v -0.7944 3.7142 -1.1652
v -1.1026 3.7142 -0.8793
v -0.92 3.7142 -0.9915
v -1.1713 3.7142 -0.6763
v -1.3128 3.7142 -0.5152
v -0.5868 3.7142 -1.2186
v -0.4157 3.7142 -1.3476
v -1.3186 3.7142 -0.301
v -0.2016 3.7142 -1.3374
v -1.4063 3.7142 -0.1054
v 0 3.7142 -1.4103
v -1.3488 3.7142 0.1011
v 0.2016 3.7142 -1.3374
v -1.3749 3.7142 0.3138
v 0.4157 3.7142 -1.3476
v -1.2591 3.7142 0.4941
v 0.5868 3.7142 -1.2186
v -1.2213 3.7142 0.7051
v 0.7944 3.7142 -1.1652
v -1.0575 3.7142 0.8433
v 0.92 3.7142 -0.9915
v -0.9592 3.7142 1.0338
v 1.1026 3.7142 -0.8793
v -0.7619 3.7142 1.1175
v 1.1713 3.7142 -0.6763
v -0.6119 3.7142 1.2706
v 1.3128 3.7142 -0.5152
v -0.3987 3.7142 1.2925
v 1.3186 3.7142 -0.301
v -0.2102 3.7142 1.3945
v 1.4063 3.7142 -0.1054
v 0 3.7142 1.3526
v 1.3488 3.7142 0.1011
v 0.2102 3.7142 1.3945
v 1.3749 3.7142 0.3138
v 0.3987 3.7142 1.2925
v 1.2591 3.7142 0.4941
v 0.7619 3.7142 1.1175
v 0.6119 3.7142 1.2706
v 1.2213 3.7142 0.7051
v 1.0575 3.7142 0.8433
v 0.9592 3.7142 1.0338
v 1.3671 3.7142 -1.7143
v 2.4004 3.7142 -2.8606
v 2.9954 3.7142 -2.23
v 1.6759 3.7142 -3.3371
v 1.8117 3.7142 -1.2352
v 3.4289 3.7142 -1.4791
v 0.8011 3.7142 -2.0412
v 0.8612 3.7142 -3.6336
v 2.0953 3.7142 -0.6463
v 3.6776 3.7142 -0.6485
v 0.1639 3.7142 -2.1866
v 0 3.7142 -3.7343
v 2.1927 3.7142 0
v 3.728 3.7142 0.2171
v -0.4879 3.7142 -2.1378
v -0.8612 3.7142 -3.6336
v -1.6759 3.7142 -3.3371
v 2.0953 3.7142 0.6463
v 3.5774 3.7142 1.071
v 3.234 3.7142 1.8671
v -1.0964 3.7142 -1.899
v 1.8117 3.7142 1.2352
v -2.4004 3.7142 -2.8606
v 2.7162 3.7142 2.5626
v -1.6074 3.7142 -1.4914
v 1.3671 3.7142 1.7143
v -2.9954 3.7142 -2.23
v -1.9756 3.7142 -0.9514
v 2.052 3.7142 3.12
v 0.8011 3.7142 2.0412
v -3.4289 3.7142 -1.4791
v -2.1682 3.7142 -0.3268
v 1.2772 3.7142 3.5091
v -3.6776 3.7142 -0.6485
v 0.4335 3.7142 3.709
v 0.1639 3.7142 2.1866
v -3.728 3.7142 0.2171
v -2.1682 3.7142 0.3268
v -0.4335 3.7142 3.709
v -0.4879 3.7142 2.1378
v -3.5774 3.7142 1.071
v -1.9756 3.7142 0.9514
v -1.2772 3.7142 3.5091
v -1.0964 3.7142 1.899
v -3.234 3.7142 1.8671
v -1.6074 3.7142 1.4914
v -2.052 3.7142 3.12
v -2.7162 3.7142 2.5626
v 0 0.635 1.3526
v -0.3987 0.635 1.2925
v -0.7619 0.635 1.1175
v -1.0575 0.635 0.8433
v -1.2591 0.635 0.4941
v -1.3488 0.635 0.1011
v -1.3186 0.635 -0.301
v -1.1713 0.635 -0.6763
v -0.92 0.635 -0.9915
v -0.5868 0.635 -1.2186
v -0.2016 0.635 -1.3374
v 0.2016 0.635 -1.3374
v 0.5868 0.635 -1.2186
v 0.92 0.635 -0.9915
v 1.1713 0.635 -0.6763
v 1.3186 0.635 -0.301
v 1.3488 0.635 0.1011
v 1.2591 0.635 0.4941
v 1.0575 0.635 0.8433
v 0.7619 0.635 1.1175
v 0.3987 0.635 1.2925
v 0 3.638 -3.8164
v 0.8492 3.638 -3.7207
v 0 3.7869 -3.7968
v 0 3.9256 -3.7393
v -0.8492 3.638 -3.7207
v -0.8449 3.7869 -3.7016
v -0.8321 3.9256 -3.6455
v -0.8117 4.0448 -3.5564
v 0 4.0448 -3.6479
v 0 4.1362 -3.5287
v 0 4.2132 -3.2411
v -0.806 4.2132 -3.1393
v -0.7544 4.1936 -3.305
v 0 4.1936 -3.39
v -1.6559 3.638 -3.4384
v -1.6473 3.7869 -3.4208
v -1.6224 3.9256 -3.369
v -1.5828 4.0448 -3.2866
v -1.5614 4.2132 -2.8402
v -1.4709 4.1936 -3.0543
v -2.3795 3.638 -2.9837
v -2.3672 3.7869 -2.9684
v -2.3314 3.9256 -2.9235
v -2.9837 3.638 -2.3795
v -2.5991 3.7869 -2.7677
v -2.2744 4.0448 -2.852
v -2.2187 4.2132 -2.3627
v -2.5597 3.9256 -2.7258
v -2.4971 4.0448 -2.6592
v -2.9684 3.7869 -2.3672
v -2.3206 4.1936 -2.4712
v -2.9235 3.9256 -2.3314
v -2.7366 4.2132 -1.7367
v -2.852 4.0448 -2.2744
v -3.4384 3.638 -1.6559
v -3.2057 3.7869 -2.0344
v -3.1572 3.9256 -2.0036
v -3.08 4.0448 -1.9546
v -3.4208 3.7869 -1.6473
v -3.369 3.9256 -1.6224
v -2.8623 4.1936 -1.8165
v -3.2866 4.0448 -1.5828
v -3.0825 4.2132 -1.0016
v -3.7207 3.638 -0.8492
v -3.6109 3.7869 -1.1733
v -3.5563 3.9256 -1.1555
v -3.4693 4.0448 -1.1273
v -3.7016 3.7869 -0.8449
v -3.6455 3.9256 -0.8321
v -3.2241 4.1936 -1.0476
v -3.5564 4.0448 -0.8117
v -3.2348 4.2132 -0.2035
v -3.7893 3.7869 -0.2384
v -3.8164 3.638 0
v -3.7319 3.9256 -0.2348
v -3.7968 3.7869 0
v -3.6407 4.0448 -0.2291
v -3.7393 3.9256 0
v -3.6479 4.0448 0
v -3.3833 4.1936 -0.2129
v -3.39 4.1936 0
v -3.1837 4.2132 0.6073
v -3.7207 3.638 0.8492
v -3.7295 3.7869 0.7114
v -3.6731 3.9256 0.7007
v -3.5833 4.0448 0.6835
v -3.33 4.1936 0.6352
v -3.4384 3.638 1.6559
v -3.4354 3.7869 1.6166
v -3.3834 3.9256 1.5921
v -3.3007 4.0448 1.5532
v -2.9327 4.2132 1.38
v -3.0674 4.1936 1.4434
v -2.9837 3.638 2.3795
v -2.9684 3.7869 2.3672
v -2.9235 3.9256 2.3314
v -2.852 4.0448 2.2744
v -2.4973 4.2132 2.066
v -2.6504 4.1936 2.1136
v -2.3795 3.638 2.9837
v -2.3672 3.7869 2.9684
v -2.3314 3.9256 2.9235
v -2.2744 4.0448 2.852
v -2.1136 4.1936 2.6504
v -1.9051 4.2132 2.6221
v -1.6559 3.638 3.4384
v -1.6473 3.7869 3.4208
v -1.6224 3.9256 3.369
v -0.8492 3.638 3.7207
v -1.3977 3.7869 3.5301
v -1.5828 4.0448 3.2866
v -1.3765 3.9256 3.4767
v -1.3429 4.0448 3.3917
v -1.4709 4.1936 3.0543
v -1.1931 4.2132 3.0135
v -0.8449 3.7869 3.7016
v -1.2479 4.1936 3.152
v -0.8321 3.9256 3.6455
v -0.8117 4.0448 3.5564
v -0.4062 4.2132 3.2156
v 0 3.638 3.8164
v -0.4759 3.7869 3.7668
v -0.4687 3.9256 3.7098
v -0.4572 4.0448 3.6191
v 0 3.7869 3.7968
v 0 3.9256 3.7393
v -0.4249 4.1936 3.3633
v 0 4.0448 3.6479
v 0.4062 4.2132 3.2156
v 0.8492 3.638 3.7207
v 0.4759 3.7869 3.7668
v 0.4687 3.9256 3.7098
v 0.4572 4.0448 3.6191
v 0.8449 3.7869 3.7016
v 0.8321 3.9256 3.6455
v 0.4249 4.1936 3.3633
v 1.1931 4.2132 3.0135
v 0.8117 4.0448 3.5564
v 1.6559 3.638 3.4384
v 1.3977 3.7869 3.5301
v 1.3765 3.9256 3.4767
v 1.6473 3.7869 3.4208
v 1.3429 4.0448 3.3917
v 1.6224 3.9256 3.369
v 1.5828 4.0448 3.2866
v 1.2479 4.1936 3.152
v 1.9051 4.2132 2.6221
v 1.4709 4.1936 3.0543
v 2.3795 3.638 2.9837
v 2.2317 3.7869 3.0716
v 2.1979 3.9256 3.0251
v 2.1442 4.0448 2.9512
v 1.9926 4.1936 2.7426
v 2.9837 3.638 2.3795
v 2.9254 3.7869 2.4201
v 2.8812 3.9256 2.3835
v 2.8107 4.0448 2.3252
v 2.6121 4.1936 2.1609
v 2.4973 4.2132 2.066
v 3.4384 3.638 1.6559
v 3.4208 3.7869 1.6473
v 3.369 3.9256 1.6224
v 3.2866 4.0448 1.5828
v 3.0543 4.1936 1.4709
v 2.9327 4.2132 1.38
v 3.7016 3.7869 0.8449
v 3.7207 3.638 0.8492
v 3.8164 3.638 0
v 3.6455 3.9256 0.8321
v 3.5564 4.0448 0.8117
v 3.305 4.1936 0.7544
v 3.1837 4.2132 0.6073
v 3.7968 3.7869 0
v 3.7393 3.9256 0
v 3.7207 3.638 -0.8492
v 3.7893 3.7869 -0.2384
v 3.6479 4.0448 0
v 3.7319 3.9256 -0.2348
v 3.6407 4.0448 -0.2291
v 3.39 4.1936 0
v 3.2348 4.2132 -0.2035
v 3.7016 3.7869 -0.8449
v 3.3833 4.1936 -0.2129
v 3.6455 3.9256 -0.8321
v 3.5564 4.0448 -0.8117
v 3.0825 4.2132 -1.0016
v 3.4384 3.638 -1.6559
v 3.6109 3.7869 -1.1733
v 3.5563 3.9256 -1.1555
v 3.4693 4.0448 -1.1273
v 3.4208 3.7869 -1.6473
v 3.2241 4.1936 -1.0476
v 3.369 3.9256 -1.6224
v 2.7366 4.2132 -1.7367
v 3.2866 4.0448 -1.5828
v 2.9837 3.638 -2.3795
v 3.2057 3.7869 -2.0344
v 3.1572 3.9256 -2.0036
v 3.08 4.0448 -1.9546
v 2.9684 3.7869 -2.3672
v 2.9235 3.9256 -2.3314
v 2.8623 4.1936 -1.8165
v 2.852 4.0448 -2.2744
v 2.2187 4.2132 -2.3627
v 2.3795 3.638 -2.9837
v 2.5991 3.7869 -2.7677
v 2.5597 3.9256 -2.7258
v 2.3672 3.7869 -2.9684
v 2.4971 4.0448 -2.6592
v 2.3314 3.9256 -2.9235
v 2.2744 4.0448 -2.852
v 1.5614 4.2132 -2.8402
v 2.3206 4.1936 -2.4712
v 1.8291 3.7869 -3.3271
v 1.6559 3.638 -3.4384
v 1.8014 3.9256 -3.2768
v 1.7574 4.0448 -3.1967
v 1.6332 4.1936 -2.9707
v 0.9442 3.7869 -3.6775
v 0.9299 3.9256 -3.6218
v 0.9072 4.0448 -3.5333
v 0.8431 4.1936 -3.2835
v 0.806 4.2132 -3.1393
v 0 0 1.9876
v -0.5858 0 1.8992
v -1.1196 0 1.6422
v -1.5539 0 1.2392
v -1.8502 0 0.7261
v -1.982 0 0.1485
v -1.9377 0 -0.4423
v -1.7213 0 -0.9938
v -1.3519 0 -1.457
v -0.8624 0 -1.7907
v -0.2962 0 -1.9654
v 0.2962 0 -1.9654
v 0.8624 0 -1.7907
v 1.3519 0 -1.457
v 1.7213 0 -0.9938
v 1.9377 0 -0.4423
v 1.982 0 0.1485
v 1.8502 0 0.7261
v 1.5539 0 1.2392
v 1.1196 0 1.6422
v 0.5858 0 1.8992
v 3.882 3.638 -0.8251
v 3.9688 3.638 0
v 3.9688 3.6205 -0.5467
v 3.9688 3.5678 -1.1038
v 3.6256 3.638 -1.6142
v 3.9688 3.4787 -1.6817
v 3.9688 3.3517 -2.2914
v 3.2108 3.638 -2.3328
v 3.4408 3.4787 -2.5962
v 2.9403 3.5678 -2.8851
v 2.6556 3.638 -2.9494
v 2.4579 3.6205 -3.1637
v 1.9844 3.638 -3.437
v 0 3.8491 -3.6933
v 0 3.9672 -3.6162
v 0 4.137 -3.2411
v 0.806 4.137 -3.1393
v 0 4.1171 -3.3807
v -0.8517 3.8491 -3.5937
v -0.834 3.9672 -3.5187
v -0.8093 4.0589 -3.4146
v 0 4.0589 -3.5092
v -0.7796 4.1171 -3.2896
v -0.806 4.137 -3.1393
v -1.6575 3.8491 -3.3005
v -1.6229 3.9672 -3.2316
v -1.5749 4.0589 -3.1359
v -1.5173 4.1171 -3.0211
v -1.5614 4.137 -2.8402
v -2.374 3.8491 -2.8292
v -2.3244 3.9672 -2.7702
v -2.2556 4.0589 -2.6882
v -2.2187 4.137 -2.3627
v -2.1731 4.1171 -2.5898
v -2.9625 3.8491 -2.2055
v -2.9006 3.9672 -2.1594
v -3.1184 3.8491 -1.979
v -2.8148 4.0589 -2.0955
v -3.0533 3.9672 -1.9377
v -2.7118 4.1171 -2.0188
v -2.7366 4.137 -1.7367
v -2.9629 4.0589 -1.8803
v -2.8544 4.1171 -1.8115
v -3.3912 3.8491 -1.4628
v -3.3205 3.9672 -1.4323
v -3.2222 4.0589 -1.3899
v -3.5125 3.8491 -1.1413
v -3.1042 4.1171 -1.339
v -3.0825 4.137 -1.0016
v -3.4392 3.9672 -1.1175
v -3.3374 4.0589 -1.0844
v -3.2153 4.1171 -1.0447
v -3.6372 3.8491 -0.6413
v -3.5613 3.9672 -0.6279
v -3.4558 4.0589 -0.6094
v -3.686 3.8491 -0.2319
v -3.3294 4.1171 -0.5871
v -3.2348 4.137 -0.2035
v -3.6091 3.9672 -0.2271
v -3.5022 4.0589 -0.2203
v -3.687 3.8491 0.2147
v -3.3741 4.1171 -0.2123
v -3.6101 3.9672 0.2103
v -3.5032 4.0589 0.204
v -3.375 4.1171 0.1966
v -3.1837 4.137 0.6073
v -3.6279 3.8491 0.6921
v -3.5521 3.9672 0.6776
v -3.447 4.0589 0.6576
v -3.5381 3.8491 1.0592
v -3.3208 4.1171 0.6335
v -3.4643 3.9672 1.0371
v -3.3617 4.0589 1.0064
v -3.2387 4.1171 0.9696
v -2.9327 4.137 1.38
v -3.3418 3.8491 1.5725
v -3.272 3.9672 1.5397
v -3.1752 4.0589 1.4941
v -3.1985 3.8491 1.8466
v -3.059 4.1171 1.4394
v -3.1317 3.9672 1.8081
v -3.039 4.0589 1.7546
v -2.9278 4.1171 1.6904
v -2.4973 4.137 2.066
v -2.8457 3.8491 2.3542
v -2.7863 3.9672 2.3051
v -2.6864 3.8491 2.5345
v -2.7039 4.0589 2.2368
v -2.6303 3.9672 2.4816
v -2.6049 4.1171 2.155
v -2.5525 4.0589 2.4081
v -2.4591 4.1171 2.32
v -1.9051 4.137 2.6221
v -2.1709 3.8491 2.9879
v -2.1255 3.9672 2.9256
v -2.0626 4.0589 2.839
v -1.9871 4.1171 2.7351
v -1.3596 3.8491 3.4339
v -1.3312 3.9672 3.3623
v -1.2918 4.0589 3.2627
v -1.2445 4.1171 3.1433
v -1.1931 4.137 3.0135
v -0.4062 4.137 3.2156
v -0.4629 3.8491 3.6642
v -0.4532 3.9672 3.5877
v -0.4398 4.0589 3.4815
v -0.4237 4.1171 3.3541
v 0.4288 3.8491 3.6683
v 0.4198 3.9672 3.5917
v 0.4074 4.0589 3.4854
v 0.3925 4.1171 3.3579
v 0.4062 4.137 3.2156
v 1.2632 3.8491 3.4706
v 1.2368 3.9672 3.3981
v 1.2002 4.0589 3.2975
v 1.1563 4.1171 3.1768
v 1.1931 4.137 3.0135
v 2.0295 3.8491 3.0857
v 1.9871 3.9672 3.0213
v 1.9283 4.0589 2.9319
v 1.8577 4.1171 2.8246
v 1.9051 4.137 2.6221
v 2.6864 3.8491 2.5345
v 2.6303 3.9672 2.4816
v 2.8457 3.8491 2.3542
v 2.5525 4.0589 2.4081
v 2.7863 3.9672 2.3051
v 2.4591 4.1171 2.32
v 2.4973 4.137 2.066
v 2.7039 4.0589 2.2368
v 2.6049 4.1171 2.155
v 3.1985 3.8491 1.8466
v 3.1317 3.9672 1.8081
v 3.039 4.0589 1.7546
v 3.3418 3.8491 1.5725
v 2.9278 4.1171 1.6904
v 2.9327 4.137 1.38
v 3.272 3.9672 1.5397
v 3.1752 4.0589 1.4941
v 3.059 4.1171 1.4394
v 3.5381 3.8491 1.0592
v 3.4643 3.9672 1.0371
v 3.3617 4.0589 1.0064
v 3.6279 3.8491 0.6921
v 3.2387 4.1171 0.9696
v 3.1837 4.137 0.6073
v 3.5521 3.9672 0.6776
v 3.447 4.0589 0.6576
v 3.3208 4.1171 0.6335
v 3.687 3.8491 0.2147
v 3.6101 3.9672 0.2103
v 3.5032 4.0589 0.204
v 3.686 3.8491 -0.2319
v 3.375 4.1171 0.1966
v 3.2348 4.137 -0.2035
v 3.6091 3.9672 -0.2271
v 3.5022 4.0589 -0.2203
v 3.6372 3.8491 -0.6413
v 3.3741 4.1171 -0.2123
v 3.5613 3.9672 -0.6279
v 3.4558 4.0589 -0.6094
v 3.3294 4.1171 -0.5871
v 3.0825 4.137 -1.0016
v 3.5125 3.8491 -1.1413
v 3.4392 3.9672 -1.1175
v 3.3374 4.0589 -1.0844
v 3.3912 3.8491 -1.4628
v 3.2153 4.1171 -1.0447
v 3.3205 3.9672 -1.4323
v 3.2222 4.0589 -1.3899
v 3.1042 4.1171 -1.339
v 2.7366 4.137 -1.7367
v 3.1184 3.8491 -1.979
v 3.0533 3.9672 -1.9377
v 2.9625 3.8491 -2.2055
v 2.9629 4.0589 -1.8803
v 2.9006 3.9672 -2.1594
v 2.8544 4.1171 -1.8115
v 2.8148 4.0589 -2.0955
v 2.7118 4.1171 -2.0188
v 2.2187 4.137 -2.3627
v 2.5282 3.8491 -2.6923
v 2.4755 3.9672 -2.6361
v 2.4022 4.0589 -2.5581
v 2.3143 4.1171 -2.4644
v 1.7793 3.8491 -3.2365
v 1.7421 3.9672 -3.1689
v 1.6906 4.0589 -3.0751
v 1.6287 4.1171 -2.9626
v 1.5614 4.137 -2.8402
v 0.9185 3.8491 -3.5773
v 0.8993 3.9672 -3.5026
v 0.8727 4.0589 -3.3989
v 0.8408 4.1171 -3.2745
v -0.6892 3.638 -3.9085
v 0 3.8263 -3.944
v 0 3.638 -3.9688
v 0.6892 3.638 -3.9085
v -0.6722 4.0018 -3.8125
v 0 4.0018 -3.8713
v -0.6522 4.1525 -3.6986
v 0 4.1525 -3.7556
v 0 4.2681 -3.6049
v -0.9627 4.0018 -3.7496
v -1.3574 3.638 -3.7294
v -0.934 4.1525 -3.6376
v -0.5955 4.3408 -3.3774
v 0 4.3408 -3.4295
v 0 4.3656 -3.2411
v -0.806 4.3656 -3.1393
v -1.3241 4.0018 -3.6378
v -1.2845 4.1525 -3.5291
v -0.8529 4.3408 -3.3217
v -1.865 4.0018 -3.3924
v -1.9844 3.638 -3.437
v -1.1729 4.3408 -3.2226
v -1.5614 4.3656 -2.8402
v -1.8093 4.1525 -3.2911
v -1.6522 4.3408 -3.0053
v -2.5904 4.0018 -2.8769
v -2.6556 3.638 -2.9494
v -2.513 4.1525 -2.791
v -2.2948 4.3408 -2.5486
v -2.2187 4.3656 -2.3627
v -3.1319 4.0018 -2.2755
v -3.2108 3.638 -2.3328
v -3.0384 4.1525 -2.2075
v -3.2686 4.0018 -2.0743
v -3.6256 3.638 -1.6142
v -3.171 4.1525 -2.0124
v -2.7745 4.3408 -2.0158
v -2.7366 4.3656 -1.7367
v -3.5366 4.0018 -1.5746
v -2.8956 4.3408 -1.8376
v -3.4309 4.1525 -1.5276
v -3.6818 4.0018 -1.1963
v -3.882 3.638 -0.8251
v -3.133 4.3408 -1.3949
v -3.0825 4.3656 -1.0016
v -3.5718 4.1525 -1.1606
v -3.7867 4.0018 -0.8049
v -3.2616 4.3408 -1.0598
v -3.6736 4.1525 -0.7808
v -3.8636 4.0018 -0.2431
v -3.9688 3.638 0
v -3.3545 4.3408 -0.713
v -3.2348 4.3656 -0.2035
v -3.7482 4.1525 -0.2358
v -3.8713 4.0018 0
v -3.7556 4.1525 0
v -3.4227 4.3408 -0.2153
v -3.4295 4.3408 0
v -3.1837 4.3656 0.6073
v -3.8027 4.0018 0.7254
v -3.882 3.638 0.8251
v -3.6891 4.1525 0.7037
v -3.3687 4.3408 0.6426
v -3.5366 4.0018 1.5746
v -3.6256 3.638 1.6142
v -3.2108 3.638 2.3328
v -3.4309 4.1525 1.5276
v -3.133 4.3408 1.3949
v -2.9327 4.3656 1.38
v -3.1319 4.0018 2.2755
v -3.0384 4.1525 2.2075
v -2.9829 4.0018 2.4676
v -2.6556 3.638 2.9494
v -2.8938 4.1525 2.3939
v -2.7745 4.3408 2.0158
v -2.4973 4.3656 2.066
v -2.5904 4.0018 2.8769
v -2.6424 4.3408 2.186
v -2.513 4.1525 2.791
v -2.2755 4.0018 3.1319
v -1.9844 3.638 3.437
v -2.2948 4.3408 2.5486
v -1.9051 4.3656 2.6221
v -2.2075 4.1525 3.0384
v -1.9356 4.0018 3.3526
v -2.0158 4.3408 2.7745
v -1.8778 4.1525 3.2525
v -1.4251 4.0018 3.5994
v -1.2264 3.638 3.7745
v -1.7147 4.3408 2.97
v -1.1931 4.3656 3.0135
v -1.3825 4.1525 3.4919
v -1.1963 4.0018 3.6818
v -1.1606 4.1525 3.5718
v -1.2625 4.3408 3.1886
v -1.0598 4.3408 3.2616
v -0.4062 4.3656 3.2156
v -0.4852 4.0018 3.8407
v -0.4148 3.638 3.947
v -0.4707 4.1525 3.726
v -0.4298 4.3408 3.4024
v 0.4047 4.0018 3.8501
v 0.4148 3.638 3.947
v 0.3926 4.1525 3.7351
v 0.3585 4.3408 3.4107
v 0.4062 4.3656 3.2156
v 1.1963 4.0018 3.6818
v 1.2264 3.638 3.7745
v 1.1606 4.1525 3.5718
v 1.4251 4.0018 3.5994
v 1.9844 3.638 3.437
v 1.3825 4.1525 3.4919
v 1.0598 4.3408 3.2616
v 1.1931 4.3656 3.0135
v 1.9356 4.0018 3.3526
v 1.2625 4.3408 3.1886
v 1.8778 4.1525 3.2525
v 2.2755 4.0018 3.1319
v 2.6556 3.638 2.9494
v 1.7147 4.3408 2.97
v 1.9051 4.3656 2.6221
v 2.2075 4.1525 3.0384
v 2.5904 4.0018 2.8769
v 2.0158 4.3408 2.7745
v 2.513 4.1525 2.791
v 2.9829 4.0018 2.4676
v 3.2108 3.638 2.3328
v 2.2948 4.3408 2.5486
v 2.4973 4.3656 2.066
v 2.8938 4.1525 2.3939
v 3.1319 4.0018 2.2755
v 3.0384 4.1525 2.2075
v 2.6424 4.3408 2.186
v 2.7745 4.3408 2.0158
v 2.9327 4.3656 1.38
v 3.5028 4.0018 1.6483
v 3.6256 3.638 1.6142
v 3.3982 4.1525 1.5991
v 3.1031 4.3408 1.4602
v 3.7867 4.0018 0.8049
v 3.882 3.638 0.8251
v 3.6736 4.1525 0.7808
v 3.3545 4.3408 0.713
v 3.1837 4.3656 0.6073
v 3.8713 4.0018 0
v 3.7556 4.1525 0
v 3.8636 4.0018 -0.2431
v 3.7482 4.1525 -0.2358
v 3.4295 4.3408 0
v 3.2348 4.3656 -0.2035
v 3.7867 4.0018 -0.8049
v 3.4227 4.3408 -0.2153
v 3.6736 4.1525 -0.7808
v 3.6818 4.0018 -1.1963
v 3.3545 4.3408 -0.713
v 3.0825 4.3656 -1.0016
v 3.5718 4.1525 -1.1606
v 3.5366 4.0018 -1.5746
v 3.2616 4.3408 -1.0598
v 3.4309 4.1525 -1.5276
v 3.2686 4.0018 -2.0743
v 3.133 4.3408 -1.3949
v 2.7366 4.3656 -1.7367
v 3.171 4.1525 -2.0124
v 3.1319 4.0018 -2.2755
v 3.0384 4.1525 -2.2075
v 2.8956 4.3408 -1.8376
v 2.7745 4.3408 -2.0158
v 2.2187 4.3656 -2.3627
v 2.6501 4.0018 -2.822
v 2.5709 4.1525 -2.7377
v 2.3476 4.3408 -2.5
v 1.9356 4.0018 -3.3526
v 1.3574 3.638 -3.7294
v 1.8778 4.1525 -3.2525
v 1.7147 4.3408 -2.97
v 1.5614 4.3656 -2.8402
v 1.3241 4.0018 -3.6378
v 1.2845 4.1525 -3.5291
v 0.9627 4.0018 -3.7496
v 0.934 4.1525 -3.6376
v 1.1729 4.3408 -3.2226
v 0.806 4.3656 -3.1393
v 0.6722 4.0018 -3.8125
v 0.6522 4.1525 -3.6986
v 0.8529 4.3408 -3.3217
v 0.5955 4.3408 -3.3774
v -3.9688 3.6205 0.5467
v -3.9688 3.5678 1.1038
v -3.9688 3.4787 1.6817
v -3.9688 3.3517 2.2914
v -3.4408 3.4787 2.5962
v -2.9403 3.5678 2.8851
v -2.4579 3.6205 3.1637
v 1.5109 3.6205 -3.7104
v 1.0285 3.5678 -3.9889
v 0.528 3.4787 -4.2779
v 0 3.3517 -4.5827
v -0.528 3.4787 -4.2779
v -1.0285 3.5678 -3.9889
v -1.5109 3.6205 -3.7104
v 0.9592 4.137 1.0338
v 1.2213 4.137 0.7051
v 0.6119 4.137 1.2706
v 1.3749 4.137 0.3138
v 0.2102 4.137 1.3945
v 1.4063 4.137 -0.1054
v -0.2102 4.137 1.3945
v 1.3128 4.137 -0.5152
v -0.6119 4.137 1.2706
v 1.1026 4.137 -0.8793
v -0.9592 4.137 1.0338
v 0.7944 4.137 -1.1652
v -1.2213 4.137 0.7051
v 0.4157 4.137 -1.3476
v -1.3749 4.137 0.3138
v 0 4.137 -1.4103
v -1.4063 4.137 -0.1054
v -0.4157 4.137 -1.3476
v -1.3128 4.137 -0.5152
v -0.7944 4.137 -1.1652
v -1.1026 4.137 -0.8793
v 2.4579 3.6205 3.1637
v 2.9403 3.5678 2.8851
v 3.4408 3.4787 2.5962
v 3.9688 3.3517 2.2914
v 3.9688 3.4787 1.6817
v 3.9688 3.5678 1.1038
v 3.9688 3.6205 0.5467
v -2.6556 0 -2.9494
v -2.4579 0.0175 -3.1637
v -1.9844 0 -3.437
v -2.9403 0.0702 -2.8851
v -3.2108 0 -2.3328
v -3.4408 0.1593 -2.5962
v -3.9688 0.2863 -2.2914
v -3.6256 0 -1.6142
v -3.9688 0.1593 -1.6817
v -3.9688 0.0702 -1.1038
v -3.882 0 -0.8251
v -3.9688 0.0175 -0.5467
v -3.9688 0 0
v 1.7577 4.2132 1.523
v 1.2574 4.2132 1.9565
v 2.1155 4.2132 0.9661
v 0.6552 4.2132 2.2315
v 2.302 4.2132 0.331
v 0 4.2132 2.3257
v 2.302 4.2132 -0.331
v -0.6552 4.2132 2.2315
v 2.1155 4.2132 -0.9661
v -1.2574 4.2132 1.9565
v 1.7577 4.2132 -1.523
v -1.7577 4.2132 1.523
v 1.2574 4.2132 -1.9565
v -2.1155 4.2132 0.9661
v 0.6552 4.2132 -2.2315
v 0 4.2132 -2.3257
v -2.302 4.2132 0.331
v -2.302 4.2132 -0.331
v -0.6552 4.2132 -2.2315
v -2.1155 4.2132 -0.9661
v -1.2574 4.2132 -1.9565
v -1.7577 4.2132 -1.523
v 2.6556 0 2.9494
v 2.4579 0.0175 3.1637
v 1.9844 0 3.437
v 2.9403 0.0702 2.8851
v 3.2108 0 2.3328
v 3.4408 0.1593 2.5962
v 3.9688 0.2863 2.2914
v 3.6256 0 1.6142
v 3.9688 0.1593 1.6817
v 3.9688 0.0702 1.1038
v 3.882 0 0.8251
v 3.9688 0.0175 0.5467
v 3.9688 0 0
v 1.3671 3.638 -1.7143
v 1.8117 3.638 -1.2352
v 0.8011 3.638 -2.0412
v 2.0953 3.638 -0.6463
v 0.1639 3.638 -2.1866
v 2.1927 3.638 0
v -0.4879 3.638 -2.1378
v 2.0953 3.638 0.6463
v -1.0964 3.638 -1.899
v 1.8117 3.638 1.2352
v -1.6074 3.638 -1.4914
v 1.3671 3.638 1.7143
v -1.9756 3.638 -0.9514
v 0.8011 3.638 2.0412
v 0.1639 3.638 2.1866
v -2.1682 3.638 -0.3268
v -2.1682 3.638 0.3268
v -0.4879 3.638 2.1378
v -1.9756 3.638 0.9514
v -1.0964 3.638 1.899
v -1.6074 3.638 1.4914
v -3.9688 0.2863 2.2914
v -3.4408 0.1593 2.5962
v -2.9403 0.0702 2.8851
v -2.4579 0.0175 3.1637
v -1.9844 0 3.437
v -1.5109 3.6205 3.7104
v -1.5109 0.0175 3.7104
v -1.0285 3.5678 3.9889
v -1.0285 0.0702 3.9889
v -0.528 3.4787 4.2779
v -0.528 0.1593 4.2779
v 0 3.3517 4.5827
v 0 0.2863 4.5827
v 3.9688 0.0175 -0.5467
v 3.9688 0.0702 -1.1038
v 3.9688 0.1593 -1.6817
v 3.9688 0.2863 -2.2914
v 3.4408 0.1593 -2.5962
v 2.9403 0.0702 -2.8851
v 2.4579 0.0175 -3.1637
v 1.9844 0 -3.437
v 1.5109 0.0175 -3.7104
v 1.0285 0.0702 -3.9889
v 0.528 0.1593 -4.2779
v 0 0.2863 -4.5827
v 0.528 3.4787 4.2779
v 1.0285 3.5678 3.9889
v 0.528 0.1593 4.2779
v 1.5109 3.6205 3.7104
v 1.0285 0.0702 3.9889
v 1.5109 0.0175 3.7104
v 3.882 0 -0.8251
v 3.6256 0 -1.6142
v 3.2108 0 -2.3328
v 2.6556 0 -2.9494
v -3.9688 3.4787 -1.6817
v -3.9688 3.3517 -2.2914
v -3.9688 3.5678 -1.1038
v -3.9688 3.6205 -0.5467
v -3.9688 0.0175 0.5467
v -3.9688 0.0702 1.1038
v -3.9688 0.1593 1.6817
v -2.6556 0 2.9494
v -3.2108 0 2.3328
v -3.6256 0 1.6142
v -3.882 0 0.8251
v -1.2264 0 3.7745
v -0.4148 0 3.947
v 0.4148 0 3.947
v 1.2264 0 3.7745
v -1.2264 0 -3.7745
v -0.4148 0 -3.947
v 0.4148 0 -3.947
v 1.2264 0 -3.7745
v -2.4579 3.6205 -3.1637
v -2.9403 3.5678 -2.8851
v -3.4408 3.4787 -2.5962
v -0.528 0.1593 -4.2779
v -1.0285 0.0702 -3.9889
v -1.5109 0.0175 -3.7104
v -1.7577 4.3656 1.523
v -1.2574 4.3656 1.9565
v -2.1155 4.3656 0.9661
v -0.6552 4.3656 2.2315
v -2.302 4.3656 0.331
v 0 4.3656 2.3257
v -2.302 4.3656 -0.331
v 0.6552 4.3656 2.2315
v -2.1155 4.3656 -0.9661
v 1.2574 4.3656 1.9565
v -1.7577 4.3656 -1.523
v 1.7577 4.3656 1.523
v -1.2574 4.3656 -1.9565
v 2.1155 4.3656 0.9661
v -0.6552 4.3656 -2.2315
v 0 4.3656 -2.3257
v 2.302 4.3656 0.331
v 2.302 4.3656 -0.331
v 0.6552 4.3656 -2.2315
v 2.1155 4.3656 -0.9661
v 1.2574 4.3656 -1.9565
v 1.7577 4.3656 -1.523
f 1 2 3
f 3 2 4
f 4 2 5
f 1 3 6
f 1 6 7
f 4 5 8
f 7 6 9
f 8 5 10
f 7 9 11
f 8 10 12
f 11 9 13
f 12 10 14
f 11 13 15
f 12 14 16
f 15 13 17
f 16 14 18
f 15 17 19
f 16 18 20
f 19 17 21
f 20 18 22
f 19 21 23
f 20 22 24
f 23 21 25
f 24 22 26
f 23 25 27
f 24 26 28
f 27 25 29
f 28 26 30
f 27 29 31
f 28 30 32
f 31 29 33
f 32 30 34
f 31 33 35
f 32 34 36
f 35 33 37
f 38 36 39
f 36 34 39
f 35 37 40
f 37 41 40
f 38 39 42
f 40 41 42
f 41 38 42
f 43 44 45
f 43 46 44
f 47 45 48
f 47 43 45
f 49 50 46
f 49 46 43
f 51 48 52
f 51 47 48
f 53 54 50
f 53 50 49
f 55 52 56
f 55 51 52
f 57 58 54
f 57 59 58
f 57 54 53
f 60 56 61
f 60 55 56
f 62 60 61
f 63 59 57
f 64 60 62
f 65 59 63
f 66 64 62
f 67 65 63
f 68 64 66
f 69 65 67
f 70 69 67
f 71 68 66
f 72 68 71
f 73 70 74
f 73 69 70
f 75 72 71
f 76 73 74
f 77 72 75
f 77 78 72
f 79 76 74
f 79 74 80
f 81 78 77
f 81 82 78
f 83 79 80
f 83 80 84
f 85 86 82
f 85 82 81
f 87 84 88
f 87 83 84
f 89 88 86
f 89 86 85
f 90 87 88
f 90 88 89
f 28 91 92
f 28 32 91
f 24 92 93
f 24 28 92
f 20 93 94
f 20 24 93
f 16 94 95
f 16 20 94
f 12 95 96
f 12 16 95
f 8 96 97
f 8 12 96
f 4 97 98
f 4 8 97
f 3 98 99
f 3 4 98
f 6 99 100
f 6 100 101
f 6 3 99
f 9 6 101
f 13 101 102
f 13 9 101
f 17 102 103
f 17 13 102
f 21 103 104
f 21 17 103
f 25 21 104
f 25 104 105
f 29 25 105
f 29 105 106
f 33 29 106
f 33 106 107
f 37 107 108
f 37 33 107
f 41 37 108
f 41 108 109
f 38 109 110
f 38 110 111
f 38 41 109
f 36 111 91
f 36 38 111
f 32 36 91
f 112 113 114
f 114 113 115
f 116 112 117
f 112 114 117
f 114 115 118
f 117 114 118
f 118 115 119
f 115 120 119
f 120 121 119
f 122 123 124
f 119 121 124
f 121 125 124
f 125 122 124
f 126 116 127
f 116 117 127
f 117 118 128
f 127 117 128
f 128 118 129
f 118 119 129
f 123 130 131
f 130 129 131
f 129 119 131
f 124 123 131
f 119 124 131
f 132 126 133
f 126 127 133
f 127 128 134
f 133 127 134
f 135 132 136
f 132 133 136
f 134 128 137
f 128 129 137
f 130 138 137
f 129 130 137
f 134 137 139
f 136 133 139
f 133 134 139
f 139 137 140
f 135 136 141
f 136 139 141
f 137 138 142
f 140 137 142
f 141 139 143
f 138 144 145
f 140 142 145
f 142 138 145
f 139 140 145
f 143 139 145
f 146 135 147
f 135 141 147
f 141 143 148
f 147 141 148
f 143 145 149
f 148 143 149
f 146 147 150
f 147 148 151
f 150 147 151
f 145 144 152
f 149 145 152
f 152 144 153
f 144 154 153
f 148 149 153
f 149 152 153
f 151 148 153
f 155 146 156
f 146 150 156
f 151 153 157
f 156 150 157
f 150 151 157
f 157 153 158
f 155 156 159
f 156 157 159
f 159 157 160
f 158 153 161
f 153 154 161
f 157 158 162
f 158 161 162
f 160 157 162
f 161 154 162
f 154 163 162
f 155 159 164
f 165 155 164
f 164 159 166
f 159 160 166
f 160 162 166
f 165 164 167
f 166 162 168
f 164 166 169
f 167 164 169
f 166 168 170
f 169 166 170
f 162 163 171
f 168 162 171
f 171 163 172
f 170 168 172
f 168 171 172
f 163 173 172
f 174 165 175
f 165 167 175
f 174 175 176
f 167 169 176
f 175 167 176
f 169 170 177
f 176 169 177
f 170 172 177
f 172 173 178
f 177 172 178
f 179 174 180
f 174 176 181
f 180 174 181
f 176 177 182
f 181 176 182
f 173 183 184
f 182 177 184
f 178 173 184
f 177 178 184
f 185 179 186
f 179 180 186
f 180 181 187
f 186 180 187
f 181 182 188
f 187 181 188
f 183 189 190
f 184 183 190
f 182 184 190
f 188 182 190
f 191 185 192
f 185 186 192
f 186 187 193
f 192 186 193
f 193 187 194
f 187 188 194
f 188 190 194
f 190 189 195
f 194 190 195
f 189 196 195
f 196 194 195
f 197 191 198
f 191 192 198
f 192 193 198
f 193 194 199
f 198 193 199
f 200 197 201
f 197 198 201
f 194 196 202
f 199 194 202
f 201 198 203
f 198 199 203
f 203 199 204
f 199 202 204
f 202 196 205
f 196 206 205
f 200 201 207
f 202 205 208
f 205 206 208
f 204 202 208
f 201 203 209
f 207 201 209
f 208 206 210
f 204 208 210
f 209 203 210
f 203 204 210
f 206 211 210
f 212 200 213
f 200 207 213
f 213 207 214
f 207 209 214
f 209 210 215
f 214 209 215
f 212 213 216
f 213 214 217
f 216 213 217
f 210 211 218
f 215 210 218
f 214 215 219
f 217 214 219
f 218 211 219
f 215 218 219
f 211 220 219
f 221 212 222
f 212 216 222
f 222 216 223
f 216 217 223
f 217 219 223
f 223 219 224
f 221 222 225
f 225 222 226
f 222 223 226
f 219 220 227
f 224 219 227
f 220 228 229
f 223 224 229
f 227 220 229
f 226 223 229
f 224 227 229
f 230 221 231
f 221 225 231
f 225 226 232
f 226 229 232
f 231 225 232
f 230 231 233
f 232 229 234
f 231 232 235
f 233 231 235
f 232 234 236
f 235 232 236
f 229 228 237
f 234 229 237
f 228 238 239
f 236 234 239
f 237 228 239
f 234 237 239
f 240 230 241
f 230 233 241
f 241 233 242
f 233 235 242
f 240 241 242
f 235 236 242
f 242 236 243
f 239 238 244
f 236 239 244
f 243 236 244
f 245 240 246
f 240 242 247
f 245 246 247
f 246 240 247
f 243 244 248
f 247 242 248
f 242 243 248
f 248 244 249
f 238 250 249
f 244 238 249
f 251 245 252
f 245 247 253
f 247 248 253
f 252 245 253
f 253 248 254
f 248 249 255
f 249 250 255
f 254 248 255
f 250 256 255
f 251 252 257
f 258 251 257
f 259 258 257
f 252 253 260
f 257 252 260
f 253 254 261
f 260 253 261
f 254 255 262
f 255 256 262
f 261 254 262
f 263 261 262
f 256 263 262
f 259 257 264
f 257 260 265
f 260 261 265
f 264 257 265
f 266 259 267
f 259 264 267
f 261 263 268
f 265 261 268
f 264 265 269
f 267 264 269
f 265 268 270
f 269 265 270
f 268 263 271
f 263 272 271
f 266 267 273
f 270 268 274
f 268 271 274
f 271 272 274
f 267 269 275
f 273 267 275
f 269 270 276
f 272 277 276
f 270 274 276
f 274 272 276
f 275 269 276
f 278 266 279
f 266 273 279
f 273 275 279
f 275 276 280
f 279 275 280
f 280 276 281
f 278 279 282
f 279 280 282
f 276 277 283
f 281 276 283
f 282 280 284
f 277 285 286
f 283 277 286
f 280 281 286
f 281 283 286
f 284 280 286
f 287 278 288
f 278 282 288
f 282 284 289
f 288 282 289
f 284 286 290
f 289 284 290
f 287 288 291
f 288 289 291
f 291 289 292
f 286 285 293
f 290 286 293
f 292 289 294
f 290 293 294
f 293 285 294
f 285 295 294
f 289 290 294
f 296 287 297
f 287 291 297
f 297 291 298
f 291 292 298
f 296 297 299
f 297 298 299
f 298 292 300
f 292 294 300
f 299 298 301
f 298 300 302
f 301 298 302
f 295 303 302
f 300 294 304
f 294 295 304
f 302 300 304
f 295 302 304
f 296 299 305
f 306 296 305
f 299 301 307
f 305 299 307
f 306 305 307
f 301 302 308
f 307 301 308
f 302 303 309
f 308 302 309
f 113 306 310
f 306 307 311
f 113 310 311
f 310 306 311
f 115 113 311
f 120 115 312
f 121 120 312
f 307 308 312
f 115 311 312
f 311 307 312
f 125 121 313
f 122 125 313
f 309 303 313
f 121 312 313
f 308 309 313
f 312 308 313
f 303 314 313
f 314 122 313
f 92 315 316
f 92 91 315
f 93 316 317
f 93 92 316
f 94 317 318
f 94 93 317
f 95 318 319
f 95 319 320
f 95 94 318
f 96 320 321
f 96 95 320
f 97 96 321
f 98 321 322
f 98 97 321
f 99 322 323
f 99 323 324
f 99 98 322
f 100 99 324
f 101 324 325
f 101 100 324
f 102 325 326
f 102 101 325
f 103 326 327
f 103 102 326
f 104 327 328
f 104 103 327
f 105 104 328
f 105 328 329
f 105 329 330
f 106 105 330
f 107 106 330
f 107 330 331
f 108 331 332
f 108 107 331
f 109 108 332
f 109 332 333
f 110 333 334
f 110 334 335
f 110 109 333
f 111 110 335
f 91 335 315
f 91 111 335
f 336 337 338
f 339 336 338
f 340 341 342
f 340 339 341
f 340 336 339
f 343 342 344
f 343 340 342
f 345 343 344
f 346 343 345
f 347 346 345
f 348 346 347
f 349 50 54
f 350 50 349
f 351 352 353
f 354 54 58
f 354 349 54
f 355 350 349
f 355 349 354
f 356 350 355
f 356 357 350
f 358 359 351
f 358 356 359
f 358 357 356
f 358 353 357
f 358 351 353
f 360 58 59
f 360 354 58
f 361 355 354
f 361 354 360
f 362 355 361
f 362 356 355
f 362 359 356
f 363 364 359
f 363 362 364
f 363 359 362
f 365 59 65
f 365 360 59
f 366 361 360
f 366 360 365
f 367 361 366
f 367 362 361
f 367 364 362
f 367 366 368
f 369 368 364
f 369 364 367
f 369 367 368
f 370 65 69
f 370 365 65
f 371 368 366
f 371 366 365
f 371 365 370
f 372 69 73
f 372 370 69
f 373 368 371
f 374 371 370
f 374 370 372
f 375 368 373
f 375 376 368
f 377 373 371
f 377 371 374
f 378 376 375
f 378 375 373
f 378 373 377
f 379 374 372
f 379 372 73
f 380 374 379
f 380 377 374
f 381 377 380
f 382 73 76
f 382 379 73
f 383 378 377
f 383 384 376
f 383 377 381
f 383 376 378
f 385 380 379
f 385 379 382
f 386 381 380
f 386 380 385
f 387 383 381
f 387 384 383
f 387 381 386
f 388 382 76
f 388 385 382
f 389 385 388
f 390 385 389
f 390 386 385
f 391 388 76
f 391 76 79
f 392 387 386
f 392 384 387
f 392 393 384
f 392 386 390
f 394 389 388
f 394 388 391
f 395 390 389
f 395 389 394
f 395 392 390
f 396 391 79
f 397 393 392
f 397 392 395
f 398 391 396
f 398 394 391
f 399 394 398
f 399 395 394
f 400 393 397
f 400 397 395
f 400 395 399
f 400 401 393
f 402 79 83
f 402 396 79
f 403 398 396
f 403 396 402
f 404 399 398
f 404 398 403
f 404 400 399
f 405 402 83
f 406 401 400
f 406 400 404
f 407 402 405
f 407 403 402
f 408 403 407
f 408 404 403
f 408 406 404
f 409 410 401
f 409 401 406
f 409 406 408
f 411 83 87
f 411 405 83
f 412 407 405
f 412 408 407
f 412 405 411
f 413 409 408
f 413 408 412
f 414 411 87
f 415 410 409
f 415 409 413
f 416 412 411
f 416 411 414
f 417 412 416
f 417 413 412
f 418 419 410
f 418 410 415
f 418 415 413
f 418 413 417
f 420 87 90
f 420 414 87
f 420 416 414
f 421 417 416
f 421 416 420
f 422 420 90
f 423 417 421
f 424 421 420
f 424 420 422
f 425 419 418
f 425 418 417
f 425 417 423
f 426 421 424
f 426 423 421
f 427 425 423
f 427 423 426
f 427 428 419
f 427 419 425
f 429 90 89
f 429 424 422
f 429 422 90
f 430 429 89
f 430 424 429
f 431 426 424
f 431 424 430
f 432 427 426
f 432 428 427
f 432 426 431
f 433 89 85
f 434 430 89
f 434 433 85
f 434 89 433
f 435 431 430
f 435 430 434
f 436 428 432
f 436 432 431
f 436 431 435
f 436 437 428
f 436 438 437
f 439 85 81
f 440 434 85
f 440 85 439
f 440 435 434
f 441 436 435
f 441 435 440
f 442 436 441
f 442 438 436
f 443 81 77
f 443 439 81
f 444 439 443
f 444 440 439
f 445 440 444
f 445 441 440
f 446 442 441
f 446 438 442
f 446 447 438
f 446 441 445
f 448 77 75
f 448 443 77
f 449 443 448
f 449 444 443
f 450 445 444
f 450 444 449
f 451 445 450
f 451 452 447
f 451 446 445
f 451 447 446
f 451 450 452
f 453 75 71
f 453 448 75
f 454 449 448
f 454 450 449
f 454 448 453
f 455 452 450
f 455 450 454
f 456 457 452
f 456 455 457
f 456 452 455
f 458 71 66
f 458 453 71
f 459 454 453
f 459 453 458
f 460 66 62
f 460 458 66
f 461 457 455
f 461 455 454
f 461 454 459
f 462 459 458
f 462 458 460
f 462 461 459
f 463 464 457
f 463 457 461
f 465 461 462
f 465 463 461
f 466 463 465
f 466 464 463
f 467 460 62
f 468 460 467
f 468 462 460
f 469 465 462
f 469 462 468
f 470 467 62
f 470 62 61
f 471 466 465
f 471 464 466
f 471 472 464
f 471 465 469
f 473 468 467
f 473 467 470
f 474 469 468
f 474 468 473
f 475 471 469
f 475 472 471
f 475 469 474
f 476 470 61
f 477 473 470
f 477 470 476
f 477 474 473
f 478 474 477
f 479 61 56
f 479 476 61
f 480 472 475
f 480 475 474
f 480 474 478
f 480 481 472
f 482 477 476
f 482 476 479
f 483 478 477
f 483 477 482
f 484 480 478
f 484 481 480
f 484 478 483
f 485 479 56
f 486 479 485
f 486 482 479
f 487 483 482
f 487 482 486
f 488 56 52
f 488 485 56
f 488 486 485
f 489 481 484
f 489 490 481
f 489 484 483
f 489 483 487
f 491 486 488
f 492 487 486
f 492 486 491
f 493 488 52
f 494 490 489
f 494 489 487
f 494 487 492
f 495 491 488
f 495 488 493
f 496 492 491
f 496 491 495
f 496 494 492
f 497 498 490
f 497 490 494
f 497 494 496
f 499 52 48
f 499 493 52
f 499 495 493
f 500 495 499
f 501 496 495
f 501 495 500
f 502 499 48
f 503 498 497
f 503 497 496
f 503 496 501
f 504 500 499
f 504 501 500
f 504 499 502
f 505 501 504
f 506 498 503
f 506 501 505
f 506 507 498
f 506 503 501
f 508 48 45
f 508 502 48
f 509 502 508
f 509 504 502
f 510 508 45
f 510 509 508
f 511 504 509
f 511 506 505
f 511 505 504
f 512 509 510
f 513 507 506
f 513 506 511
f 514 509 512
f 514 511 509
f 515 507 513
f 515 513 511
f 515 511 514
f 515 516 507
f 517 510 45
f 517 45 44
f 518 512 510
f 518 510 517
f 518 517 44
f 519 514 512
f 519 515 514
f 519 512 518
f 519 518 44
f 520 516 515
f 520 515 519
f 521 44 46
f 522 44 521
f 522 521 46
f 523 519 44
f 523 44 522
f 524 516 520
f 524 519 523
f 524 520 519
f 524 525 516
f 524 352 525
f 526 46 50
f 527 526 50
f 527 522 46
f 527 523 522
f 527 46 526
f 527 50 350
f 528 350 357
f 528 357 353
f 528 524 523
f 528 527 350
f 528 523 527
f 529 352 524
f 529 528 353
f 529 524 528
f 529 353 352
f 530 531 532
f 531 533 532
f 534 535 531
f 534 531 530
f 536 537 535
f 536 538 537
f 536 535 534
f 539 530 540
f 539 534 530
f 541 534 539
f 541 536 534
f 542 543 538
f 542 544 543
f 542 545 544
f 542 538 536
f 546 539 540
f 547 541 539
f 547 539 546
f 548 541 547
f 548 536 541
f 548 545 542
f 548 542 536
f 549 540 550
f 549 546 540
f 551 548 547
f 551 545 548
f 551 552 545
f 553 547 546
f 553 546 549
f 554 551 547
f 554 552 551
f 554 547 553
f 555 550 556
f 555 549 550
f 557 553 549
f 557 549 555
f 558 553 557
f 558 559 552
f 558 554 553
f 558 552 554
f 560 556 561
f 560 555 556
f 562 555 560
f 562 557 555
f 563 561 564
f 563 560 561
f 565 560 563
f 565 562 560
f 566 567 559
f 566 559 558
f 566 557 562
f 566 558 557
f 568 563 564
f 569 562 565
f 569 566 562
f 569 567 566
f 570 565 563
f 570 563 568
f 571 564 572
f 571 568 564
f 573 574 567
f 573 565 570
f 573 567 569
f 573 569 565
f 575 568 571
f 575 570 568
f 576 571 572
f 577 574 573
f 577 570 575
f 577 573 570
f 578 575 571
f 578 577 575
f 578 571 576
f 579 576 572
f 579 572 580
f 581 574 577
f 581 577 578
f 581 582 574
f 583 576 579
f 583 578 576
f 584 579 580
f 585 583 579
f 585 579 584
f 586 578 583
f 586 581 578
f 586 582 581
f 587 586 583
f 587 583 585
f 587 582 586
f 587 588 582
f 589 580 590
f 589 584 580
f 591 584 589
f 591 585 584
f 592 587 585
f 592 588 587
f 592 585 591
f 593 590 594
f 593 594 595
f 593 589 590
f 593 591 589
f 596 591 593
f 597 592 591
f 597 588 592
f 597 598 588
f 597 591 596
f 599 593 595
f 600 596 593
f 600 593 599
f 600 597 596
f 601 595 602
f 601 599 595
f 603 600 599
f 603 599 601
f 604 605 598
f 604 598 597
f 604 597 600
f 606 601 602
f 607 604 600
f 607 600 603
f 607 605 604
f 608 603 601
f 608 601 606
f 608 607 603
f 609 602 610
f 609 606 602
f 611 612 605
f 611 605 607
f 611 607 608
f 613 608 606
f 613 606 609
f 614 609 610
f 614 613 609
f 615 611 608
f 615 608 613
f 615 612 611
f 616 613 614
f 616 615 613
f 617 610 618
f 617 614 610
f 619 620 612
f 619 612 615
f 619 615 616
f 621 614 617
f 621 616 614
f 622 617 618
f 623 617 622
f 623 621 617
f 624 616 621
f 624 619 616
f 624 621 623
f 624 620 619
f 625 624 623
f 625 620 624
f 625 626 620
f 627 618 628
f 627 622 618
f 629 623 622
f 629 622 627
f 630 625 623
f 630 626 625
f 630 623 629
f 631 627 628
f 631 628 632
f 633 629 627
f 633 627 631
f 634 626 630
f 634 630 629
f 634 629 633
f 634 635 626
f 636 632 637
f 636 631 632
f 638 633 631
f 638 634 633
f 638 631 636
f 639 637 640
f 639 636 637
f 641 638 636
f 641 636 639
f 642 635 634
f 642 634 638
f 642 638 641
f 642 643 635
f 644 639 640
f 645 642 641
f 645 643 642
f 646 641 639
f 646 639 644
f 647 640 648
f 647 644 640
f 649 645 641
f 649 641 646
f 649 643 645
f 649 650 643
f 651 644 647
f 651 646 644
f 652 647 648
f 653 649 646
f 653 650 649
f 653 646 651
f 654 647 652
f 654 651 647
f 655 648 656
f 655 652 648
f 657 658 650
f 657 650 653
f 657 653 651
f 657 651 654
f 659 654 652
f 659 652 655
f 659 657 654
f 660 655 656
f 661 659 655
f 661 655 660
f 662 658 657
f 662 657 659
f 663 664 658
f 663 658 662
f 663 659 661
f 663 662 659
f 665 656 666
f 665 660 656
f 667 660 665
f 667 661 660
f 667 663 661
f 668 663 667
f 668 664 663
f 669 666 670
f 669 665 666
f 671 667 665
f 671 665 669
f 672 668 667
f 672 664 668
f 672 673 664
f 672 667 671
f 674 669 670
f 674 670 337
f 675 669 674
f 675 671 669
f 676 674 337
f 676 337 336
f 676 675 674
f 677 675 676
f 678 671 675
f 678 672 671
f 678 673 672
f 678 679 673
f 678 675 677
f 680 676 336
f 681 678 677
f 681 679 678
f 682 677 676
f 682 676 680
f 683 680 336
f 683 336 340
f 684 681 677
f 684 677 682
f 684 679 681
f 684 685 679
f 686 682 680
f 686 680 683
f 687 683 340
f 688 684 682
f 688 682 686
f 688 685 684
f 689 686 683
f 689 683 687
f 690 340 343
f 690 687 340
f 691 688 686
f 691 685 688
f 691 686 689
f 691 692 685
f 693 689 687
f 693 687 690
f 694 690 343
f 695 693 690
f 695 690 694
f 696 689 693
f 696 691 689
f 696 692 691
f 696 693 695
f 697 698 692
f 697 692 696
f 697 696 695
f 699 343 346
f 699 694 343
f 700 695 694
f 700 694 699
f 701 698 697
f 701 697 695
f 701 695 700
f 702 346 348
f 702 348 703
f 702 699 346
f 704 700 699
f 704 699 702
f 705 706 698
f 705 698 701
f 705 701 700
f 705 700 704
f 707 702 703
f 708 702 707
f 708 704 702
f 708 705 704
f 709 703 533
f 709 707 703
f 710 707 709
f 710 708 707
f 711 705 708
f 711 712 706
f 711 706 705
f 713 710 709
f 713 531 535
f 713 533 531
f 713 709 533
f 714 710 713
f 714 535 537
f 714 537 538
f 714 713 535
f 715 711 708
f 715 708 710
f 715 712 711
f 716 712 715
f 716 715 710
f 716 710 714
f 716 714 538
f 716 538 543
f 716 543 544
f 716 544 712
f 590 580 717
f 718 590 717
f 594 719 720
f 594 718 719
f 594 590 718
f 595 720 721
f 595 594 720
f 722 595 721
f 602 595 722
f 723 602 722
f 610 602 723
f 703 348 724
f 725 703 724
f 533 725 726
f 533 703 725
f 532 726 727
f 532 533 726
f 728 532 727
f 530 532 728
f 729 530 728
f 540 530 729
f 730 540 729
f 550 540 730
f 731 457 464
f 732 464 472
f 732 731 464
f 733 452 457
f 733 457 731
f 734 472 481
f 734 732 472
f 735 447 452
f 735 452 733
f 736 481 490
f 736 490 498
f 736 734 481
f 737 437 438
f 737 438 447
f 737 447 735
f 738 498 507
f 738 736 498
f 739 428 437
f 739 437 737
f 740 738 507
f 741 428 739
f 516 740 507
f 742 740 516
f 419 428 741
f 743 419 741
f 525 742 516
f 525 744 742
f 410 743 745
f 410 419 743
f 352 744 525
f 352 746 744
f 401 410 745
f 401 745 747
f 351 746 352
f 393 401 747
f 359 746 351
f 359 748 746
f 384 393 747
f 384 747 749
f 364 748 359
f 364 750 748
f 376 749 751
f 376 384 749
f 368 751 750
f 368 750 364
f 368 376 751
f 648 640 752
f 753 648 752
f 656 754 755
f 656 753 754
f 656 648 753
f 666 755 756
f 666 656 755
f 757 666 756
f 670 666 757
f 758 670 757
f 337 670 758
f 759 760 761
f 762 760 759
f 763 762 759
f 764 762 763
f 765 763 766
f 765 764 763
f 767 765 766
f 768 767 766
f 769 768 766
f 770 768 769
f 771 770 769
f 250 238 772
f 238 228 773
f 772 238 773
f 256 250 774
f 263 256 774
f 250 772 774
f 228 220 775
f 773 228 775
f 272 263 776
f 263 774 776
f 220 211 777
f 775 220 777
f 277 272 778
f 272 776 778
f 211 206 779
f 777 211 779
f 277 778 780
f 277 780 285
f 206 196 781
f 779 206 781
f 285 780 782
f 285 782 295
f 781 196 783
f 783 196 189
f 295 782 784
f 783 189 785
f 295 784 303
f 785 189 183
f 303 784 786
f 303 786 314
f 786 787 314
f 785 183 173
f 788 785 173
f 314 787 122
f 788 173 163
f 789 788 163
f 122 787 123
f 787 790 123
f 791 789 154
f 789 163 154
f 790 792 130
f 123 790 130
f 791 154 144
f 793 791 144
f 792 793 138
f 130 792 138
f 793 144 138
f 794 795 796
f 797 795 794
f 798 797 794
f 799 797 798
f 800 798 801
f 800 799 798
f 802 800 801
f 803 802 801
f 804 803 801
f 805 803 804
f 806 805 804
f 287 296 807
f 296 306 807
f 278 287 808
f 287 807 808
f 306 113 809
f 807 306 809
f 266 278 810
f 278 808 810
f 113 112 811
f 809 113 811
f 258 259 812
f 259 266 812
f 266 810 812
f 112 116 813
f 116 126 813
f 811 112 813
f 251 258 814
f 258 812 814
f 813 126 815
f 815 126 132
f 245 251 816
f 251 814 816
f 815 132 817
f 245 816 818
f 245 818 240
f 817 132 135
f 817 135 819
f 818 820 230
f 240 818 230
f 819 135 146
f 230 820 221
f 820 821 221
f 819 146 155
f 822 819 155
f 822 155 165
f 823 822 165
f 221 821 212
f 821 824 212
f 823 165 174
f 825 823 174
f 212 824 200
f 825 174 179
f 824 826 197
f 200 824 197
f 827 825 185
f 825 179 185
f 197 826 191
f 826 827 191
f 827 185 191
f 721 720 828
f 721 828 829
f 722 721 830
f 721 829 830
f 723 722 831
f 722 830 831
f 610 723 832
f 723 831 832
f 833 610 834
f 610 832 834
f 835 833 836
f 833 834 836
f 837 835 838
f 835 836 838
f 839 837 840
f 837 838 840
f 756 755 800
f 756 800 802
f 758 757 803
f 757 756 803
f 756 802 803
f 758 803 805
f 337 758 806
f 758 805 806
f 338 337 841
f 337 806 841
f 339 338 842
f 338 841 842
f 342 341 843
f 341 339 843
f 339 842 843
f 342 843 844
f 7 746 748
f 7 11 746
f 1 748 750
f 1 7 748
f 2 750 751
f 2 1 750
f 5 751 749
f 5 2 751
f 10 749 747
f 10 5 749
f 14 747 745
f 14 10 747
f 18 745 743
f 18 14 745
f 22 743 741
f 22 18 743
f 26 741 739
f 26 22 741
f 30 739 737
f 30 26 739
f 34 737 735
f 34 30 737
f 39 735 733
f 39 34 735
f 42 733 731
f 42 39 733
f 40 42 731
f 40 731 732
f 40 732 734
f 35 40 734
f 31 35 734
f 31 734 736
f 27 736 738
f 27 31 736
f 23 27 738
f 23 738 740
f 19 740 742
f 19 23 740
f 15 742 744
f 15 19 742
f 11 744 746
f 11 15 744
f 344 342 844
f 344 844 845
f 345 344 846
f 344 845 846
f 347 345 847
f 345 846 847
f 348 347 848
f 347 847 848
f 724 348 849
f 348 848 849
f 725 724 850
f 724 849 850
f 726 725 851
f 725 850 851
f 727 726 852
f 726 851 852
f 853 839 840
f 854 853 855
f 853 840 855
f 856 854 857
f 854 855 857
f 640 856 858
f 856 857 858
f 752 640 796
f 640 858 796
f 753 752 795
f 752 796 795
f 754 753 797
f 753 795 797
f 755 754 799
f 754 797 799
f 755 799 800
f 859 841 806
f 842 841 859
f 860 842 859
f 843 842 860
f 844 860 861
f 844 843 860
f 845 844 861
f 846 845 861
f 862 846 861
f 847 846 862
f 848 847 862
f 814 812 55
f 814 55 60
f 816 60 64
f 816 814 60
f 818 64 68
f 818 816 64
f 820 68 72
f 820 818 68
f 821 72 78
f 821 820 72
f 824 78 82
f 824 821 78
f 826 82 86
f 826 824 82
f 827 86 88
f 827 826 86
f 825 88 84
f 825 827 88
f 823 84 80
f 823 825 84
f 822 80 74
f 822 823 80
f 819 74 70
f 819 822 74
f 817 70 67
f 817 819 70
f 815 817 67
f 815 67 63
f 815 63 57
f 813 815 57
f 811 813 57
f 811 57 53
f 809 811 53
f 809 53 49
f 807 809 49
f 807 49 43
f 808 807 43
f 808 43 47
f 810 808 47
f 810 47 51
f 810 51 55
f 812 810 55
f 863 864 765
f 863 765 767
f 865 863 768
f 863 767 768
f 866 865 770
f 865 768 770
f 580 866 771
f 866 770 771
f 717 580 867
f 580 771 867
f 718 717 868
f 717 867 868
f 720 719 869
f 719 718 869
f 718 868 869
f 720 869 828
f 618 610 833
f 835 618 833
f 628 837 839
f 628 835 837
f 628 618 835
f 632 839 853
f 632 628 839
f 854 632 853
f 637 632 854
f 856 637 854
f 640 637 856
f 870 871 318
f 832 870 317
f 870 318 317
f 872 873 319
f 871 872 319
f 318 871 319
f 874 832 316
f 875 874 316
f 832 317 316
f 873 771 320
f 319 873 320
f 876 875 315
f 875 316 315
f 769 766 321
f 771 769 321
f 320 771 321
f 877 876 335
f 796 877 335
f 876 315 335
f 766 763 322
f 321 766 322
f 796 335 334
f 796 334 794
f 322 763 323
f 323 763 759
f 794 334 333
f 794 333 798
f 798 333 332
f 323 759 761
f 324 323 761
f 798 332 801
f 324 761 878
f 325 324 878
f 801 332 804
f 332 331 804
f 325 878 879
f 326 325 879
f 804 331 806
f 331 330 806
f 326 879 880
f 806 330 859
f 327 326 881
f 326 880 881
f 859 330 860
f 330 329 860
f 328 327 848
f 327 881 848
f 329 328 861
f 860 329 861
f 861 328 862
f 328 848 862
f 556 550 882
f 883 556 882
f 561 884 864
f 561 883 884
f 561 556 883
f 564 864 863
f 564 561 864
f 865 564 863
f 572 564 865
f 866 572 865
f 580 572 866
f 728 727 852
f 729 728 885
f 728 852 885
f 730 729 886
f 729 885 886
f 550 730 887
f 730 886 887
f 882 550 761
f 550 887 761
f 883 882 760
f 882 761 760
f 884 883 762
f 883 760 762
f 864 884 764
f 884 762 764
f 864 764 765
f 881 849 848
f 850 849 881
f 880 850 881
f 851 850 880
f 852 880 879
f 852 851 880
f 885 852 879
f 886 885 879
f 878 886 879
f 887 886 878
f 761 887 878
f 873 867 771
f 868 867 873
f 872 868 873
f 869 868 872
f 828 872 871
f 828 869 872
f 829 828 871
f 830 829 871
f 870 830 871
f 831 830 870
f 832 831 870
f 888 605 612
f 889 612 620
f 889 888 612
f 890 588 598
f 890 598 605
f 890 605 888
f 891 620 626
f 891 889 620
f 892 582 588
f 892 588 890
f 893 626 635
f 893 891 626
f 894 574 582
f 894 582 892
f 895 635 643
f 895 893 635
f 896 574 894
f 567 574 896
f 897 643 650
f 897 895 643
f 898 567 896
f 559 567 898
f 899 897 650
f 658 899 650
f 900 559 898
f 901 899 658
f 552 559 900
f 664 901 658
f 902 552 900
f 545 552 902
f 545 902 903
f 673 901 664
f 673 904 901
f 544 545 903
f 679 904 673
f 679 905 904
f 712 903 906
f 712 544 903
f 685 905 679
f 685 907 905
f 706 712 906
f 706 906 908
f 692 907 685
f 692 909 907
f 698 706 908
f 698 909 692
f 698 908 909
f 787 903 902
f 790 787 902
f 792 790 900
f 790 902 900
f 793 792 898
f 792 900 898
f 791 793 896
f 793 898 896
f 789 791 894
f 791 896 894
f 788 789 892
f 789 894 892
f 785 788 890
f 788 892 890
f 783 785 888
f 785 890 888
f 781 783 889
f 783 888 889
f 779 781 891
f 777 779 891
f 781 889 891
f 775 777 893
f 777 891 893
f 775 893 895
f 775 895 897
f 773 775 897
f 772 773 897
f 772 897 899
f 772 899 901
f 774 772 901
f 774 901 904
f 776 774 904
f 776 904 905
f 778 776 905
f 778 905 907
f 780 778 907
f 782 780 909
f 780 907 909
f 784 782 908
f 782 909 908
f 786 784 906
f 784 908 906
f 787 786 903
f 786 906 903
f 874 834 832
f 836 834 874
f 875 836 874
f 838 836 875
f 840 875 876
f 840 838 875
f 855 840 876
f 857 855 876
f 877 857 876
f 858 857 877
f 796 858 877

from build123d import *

# Parameters (mm, degrees)
EXTRUDE1_DEPTH      = 4.365625
SKETCH2_W           = 1.7526
SKETCH2_H           = 4.365625
LPATTERN1_COUNT     = 6
LPATTERN1_PITCH     = 0.79375
LPATTERN1_COL_COUNT = 2
LPATTERN1_COL_PITCH = 0.79375
SKETCH8_R           = 2.192732982
BOSS_EXTRUDE1_DEPTH = 3.714221


with BuildPart() as part:
    # Sketch1 → Extrude1 (new body)
    with BuildSketch(Plane(origin=(0, 0, 0), x_dir=(1, 0, 0), z_dir=(0, 1, 0))):
        Polygon((0, 4.582717762), (-3.96875, 2.291358881), (-3.96875, -2.291358881), (0, -4.582717762), (3.96875, -2.291358881), (3.96875, 2.291358881), align=None)
    extrude(amount=EXTRUDE1_DEPTH)

    # Sketch4 → Cut-Revolve2 (revolve, cut)
    with BuildSketch(Plane(origin=(0, 0, 0), x_dir=(0, 0, -1), z_dir=(1, 0, 0))):
        Polygon((0, 4.365625), (1.7526, 4.365625), (1.410275607, 4.205996514), (1.410275607, 0.159628486), (1.7526, 0), (0, 0), align=None)
    revolve(axis=Axis((0, 4.365625, 0), (0, 1, 0)), mode=Mode.SUBTRACT)


with BuildPart() as body_2:
    # Sketch2 → Revolve1 (revolve)
    with BuildSketch(Plane(origin=(0, 0, 0), x_dir=(0, 0, -1), z_dir=(1, 0, 0))):
        with Locations((0.8763, 2.1828125)):
            Rectangle(SKETCH2_W, SKETCH2_H)
    revolve(axis=Axis((0, -1.7526, 0), (0, 1, 0)))

    # Sketch3 → Cut-Revolve1 (revolve, cut)
    with BuildSketch(Plane(origin=(0, 0, 0), x_dir=(0, 0, -1), z_dir=(1, 0, 0))):
        Polygon((1.774513192, 4.268856346), (1.927905533, 3.591475768), (1.454101991, 3.7385105), (1.410275607, 3.932047808), align=None)
    cut_revolve1 = revolve(axis=Axis((0, 4.365625, 0.193538035), (0, -0.975306119, -0.220857364)), mode=Mode.SUBTRACT)

    # LPattern1: Cut-Revolve1 ×6
    with Locations(*[(0, -i * LPATTERN1_PITCH, 0) for i in range(1, LPATTERN1_COUNT)]):
        add(cut_revolve1, mode=Mode.SUBTRACT)

    # LPattern1 col: Cut-Revolve1 ×2
    with Locations(*[(0, i * LPATTERN1_COL_PITCH, 0) for i in range(1, LPATTERN1_COL_COUNT)]):
        add(cut_revolve1, mode=Mode.SUBTRACT)


with BuildPart() as part_1:
    add(part.part)

    # Combine1: cut body 2
    add(body_2.part, mode=Mode.SUBTRACT)

    # Sketch5 → Cut-Revolve3 (revolve, cut)
    with BuildSketch(Plane(origin=(0, 0, 0), x_dir=(0, 0, -1), z_dir=(1, 0, 0))):
        with BuildLine():
            Line((0, 0), (3.96875, 0))
            Line((3.96875, 0), (4.582717762, 0.286297869))
            Line((4.582717762, 0.286297869), (4.582717762, 3.351722964))
            Line((4.582717762, 3.351722964), (3.96875, 3.638020833))
            ThreePointArc((3.96875, 3.638020833), (3.755639674, 4.152514674), (3.241145833, 4.365625))
            Line((3.241145833, 4.365625), (3.241145833, 5.635625))
            Line((3.241145833, 5.635625), (5.852717762, 5.635625))
            Line((5.852717762, 5.635625), (5.852717762, -1.27))
            Line((5.852717762, -1.27), (0, -1.27))
            Line((0, -1.27), (0, 0))
        make_face()
    revolve(axis=Axis((0, 0, 0), (0, 1, 0)), mode=Mode.SUBTRACT)

    # Sketch6 → Cut-Revolve4 (revolve, cut)
    with BuildSketch(Plane(origin=(0, 0, 0), x_dir=(0, 0, -1), z_dir=(1, 0, 0))):
        with BuildLine():
            Line((0, 3.638020833), (3.81635, 3.638020833))
            ThreePointArc((3.81635, 3.638020833), (3.6478766, 4.0447516), (3.241145833, 4.213225))
            Line((3.241145833, 4.213225), (2.32571072, 4.213225))
            Line((2.32571072, 4.213225), (2.32571072, 5.635625))
            Line((2.32571072, 5.635625), (0, 5.635625))
            Line((0, 5.635625), (0, 3.638020833))
        make_face()
    revolve(axis=Axis((0, 5.635625, 0), (0, 1, 0)), mode=Mode.SUBTRACT)



with BuildPart() as body_2_2:
    # Sketch7 → Revolve2 (revolve)
    with BuildSketch(Plane(origin=(0, 0, 0), x_dir=(0, 0, -1), z_dir=(1, 0, 0))):
        with BuildLine():
            Line((1.410275607, 3.714220833), (3.734297654, 3.714220833))
            ThreePointArc((3.734297654, 3.714220833), (3.565938876, 4.016854092), (3.241145833, 4.137025))
            Line((3.241145833, 4.137025), (1.410275607, 4.137025))
            Line((1.410275607, 4.137025), (1.410275607, 3.714220833))
        make_face()
    revolve(axis=Axis((0, 3.714220833, 0), (0, 1, 0)))


with BuildPart() as part_2:
    add(part_1.part)

    add(body_2_2.part)  # Boss-Extrude1 merges body 2 2
    # Sketch8 → Boss-Extrude1 (add)
    with BuildSketch(Plane.XZ):
        Circle(SKETCH8_R)
    extrude(amount=-BOSS_EXTRUDE1_DEPTH)

    # Sketch10 → #6-32 Tapped Hole1 (revolve, cut)
    with BuildSketch(Plane(origin=(0, 3.714220833, 0), x_dir=(0, 0, 1), z_dir=(1, 0, 0))):
        Polygon((0, 0), (0, 3.714220833), (1.98755, 3.714220833), (1.35255, 3.079220833), (1.35255, 0), align=None)
    revolve(axis=Axis((0, 10.064220833, 0), (0, -1, 0)), mode=Mode.SUBTRACT)


solid = part_2.part
